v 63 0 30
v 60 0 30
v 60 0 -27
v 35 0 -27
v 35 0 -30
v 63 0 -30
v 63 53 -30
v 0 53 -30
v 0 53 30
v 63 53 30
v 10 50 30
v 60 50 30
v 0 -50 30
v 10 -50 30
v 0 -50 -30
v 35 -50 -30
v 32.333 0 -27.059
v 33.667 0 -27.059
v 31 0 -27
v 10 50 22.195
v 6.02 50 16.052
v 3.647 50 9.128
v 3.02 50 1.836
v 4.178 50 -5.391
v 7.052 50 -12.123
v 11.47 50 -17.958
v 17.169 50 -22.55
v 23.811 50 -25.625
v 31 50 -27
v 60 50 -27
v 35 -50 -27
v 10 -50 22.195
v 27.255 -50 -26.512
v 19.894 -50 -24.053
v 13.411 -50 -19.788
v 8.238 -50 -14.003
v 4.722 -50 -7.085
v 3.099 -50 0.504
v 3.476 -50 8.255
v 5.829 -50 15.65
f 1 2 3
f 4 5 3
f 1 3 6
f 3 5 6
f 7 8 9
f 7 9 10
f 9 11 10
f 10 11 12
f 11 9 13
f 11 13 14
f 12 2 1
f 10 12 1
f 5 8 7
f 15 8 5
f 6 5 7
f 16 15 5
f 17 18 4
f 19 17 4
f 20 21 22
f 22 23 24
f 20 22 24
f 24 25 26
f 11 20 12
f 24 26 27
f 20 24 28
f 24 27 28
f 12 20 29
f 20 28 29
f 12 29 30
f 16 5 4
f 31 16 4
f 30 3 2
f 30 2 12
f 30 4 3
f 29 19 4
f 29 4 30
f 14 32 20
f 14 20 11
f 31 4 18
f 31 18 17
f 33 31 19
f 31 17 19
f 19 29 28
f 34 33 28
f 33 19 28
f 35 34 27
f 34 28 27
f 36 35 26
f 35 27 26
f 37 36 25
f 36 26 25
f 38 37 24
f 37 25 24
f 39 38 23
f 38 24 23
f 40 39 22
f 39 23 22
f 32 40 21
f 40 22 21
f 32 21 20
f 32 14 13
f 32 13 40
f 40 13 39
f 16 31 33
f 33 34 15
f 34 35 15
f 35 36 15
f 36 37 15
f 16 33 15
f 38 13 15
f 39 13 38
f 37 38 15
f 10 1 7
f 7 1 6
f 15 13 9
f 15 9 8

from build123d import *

# Parameters (mm, degrees)
SKETCH1_W           = 60
SKETCH1_H           = 100
BOSS_EXTRUDE1_DEPTH = 3
SKETCH2_W           = 3
SKETCH2_H           = 50
BOSS_EXTRUDE2_DEPTH = 60
SKETCH3_W           = 3
SKETCH3_H           = 50
BOSS_EXTRUDE3_DEPTH = 57
SKETCH4_W           = 63
SKETCH4_H           = 60
BOSS_EXTRUDE4_DEPTH = 3
BOSS_EXTRUDE6_REACH = 123.939


with BuildPart() as part:
    # Sketch1 → Boss-Extrude1 (new body)
    with BuildSketch(Plane(origin=(0, 0, 0), x_dir=(0, 0, -1), z_dir=(1, 0, 0))):
        Rectangle(SKETCH1_W, SKETCH1_H)
    extrude(amount=BOSS_EXTRUDE1_DEPTH)

    # Sketch2 → Boss-Extrude2 (add)
    with BuildSketch(Plane(origin=(3, 0, 0), x_dir=(0, 0, -1), z_dir=(1, 0, 0))):
        with Locations((28.5, 25)):
            Rectangle(SKETCH2_W, SKETCH2_H)
    extrude(amount=BOSS_EXTRUDE2_DEPTH)

    # Sketch3 → Boss-Extrude3 (add)
    with BuildSketch(Plane.XY.offset(-27)):
        with Locations((61.5, 25)):
            Rectangle(SKETCH3_W, SKETCH3_H)
    extrude(amount=BOSS_EXTRUDE3_DEPTH)

    # Sketch4 → Boss-Extrude4 (add)
    with BuildSketch(Plane(origin=(0, 50, 0), x_dir=(1, 0, 0), z_dir=(0, 1, 0))):
        with Locations((31.5, 0)):
            Rectangle(SKETCH4_W, SKETCH4_H)
    extrude(amount=BOSS_EXTRUDE4_DEPTH)

    # Boss-Extrude6: up to this face of the body (flat: up to its plane)
    boss_extrude6_end = Plane(part.part.faces().sort_by_distance((1.5, -50, 0))[0])
    # Sketch7 → Boss-Extrude6 (add, up to the picked face)
    with BuildSketch(Plane.XZ.offset(-50), mode=Mode.PRIVATE) as boss_extrude6_sk1:
        with BuildLine():
            Line((0, -30), (35, -30))
            Line((35, -30), (35, -27))
            ThreePointArc((35, -27), (6.255324942, -10.658001188), (10, 22.194619378))
            Line((10, 22.194619378), (10, 30))
            Line((10, 30), (0, 30))
            Line((0, 30), (0, -30))
        make_face()
    boss_extrude6_tool1 = split(extrude(boss_extrude6_sk1.sketch, amount=BOSS_EXTRUDE6_REACH, mode=Mode.PRIVATE), bisect_by=boss_extrude6_end, keep=Keep.BOTH, mode=Mode.PRIVATE)
    add(boss_extrude6_tool1.solids().sort_by(Axis((17.5, 50, -29.305378), (0, -1, 0)))[0])


solid = part.part
